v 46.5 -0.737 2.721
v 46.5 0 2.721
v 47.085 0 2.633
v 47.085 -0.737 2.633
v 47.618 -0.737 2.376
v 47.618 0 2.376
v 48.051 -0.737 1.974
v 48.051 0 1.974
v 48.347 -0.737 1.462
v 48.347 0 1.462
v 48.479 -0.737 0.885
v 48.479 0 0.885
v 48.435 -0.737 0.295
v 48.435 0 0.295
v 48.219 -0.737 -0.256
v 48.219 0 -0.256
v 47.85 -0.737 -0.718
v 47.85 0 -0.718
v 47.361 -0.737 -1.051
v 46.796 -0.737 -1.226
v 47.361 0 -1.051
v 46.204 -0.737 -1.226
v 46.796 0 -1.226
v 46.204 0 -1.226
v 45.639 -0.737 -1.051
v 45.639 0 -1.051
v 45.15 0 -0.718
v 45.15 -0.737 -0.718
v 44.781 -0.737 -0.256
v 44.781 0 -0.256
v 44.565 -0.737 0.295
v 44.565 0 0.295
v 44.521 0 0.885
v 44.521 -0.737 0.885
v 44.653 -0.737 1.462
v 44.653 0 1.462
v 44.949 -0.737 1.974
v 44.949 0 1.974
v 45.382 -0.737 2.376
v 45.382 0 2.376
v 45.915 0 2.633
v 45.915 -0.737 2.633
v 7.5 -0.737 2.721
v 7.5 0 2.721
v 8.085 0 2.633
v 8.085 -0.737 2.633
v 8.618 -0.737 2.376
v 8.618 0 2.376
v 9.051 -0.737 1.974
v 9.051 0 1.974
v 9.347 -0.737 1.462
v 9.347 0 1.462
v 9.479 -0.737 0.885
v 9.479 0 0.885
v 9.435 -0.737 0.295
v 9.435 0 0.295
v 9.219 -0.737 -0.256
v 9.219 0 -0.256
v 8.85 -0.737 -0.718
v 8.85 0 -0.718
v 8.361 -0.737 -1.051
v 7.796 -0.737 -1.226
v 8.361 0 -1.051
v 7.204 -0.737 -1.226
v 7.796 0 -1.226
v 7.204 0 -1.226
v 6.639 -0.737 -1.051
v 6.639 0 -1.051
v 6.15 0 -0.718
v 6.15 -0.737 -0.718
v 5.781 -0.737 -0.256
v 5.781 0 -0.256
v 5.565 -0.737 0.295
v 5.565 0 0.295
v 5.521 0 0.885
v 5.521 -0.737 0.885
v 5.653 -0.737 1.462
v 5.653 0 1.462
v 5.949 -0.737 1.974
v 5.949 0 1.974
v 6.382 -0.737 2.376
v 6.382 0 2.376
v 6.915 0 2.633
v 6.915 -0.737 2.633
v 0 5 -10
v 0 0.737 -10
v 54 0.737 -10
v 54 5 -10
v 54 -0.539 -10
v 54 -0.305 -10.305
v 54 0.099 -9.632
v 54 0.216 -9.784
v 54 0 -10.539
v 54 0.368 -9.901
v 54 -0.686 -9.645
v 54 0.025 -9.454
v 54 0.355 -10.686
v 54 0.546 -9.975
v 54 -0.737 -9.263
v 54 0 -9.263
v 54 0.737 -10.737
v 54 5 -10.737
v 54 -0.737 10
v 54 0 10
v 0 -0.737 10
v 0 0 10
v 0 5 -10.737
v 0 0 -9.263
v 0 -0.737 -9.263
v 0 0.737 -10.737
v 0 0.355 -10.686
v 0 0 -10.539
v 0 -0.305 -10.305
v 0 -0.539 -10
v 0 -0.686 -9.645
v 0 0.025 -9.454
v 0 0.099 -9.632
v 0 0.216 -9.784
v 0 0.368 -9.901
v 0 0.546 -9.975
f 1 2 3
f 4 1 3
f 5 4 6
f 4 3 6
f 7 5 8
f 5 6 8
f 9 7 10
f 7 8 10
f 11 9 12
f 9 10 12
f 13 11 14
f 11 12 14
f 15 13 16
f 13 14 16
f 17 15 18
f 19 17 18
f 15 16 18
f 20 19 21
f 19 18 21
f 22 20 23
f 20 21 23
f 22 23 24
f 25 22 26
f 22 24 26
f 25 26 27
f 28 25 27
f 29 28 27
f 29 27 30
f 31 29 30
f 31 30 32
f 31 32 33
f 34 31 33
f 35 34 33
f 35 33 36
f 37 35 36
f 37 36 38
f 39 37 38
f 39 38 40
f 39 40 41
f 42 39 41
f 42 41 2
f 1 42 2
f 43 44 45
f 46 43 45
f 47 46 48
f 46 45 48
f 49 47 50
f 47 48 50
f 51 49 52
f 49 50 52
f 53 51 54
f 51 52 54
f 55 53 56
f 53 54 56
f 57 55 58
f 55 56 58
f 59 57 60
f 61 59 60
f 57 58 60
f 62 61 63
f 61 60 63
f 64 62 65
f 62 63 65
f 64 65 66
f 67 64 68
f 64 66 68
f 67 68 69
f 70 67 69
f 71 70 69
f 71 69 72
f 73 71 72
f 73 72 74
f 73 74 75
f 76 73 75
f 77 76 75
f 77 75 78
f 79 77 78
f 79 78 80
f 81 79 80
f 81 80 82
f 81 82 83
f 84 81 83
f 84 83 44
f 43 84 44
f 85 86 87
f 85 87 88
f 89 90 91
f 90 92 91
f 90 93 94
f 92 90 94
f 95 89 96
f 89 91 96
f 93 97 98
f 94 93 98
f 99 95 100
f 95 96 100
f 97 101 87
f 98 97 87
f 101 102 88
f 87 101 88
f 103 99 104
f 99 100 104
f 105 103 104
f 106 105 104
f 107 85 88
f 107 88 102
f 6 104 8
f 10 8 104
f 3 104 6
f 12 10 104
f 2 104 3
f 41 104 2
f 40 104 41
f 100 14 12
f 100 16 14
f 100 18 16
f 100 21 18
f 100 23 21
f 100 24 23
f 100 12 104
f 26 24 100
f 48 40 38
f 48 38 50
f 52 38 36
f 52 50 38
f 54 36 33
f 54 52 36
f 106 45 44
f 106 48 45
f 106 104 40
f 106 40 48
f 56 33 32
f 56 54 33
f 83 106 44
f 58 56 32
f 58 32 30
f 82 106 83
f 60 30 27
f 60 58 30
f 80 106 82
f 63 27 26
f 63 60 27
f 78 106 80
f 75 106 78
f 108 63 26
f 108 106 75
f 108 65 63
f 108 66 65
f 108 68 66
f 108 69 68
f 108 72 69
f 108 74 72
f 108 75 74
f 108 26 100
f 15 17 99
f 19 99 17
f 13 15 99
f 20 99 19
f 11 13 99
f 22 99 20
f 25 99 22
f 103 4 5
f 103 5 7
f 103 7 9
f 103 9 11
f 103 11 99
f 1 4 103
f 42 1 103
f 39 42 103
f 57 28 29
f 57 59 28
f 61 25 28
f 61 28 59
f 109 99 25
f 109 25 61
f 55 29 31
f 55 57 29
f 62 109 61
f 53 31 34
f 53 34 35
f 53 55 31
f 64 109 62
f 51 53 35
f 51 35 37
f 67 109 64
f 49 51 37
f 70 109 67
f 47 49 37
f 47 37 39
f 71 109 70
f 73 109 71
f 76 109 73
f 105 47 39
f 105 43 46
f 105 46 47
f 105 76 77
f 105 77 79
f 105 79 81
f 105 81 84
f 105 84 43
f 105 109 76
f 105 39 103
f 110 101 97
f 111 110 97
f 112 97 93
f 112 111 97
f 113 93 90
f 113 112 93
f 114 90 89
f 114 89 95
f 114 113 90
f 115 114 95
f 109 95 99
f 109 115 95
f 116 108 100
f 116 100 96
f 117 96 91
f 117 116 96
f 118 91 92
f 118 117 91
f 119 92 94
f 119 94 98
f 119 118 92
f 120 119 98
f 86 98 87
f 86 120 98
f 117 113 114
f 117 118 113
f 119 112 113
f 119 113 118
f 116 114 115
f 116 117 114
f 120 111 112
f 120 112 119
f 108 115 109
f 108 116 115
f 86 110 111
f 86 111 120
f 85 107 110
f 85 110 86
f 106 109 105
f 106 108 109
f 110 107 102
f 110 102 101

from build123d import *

# Parameters (mm, degrees)
BASE_FLANGE1_DEPTH = 54
SKETCH6_R          = 1.984375
CUT_EXTRUDE1_DEPTH = 56.283583274


# Sheet-metal steps are written as plain solids
with BuildPart() as part:
    # Sketch1 → Base-Flange1 (new body)
    with BuildSketch(Plane(origin=(0, 0, 0), x_dir=(0, 0, -1), z_dir=(1, 0, 0))):
        with BuildLine():
            Line((-10, 0), (9.2634, 0))
            ThreePointArc((9.2634, 0), (9.784254855, 0.215745145), (10, 0.7366))
            Line((10, 0.7366), (10, 5))
            Line((10, 5), (10.7366, 5))
            Line((10.7366, 5), (10.7366, 0.7366))
            ThreePointArc((10.7366, 0.7366), (10.30510971, -0.30510971), (9.2634, -0.7366))
            Line((9.2634, -0.7366), (-10, -0.7366))
            Line((-10, -0.7366), (-10, 0))
        make_face()
    extrude(amount=BASE_FLANGE1_DEPTH)

    # Sketch6 → Cut-Extrude1 (cut, through all)
    with BuildSketch(Plane(origin=(0, 0, 0), x_dir=(1, 0, 0), z_dir=(0, 1, 0))):
        with Locations(Location((7.5, -0.7366, 0), (0, 0, 270))):
            Circle(SKETCH6_R)
        with Locations(Location((46.5, -0.7366, 0), (0, 0, 270))):
            Circle(SKETCH6_R)
    extrude(amount=-CUT_EXTRUDE1_DEPTH, mode=Mode.SUBTRACT)


solid = part.part
